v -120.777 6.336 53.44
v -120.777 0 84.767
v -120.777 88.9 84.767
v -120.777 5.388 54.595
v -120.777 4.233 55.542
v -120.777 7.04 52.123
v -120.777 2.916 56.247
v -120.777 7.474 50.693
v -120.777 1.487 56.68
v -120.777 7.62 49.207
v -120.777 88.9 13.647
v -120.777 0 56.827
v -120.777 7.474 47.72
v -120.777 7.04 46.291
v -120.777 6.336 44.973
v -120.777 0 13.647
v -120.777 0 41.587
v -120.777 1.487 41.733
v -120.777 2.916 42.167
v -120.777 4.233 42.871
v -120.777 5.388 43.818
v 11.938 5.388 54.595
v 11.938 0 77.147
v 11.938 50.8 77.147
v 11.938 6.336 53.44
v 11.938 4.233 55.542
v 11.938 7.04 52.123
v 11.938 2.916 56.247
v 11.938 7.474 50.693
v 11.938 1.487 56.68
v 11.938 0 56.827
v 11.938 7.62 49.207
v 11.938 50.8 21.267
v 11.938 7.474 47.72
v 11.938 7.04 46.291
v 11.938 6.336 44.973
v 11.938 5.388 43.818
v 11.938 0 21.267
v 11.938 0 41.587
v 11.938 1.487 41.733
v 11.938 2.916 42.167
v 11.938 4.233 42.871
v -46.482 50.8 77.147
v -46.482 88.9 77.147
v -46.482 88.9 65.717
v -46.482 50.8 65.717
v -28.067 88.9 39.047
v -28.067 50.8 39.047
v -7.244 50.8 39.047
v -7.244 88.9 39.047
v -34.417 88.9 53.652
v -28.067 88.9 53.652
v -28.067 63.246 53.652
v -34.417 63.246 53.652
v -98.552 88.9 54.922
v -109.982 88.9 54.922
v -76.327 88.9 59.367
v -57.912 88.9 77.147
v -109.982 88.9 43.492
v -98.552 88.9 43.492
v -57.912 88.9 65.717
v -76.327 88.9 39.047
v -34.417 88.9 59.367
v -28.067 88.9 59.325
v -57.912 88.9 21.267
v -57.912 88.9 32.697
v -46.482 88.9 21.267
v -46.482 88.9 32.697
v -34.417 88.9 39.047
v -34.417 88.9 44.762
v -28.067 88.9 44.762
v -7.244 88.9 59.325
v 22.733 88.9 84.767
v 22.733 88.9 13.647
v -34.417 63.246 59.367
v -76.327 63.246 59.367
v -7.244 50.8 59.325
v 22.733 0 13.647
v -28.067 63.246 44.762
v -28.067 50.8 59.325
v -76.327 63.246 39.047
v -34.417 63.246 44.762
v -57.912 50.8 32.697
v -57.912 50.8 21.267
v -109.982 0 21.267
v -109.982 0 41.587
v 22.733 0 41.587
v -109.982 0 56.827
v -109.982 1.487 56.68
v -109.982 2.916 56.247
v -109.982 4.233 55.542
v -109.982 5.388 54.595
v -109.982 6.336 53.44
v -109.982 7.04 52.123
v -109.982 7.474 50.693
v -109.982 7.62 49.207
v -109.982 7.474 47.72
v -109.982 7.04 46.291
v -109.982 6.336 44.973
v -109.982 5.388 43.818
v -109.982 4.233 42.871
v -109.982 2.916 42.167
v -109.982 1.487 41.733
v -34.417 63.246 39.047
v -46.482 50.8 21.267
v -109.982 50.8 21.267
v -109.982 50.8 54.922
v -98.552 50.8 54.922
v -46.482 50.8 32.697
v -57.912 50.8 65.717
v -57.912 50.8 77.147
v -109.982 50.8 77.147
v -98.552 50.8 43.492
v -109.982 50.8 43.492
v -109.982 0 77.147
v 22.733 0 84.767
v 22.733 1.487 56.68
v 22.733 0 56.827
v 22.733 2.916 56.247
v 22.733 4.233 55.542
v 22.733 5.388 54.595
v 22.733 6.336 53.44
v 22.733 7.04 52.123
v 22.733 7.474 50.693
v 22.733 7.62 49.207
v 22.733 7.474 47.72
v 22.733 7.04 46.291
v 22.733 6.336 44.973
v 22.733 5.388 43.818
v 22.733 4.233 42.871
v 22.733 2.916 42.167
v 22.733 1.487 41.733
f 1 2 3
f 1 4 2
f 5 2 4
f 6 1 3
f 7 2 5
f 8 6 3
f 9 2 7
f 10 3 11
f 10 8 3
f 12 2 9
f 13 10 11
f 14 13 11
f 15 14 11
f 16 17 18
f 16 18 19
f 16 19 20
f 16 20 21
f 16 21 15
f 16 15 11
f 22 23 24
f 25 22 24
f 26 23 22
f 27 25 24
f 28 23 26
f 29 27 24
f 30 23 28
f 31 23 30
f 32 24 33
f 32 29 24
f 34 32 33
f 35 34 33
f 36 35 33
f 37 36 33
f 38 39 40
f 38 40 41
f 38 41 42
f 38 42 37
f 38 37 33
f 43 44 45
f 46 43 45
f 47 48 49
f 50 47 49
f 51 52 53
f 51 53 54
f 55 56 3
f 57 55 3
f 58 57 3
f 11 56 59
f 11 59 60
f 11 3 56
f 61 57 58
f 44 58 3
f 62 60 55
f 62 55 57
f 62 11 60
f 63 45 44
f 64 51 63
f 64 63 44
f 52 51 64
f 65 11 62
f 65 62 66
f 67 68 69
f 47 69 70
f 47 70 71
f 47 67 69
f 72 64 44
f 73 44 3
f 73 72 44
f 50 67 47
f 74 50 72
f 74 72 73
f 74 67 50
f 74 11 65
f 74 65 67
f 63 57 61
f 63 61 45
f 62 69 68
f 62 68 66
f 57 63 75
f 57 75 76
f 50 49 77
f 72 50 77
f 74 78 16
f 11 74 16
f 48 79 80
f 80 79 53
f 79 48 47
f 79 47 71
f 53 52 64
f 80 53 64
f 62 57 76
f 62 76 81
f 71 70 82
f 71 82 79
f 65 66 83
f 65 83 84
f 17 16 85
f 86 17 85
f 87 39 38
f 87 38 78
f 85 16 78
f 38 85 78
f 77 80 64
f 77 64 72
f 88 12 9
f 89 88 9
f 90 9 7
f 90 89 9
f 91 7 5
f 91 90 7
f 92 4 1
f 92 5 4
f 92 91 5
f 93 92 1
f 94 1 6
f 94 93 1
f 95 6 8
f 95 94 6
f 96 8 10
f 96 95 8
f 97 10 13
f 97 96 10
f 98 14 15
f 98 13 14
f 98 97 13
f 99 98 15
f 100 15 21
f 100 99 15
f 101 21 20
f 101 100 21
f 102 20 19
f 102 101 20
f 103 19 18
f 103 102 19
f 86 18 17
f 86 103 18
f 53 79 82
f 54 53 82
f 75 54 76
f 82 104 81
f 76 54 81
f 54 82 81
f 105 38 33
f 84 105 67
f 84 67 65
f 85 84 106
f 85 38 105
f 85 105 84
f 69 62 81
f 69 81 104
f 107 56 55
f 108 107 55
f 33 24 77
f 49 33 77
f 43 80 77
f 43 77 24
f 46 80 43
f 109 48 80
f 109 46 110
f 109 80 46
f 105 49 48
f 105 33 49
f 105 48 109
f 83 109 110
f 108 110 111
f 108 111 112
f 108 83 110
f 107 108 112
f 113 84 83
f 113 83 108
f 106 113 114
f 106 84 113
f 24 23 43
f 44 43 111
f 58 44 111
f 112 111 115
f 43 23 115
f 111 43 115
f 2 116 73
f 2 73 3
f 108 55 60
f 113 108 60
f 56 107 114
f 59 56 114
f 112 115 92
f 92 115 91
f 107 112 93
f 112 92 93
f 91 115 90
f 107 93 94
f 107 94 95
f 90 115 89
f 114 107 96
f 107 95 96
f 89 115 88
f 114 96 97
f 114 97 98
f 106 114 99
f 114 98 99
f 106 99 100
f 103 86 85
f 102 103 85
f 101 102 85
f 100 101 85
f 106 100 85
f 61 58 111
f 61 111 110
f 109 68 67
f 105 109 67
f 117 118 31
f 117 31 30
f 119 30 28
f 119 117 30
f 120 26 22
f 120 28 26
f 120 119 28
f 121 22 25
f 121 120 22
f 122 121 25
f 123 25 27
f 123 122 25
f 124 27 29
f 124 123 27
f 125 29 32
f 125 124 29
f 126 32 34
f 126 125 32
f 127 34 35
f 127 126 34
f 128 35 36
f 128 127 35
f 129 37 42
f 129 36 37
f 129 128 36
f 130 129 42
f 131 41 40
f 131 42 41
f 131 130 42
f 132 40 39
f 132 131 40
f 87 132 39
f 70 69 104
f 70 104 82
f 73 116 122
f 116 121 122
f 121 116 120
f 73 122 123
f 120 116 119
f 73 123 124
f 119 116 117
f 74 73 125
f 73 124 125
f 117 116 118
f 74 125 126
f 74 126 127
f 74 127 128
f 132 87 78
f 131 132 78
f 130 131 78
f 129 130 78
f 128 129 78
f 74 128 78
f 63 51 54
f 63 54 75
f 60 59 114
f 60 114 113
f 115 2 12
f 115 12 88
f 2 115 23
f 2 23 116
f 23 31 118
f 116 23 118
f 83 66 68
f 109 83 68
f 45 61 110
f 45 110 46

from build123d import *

# Parameters (mm, degrees)
SKETCH1_W                = 143.51
SKETCH1_H                = 121.92
BIG_BLOCK_DEPTH          = 88.9
SERVO_CUTOUT_DEPTH       = 25.654
SKETCH3_W                = 121.92
SKETCH3_H                = 55.88
CUT_EXTRUDE2_DEPTH       = 50.8
CUT_EXTRUDE18_DEPTH      = 172.184986353
CUT_EXTRUDE18_DEPTH_BACK = 48.26
SKETCH6_W                = 20.822928363
SKETCH6_H                = 20.278092026
SKETCH10_W               = 11.43
SKETCH10_H               = 11.43
CUT_EXTRUDE19_DEPTH      = 187.082964166
SKETCH11_W               = 11.43
SKETCH11_H               = 11.43
CUT_EXTRUDE20_DEPTH      = 187.082964166
SKETCH9_W                = 11.43
SKETCH9_H                = 11.43
CUT_EXTRUDE22_DEPTH      = 187.082964166
SKETCH12_W               = 143.51
SKETCH12_H               = 25.4
REMOVESIDES_DEPTH        = 187.082964166
CUT_EXTRUDE23_DEPTH      = 189.901333259
CUT_EXTRUDE23_DEPTH_BACK = 189.901333259


with BuildPart() as part:
    # Sketch1 → Big Block (new body)
    with BuildSketch(Plane(origin=(0, 0, 0), x_dir=(1, 0, 0), z_dir=(0, 1, 0))):
        with Locations((-49.021531365, -49.206642066)):
            Rectangle(SKETCH1_W, SKETCH1_H)
    extrude(amount=BIG_BLOCK_DEPTH)

    # Sketch2 → Servo Cutout (cut)
    with BuildSketch(Plane(origin=(0, 88.9, 0), x_dir=(1, 0, 0), z_dir=(0, 1, 0))):
        Polygon((-76.326531365, -39.046642066), (-34.416531365, -39.046642066), (-34.416531365, -44.761642066), (-19.176531365, -44.761642066), (-19.176531365, -53.651642066), (-34.416531365, -53.651642066), (-34.416531365, -59.366642066), (-76.326531365, -59.366642066), align=None)
    extrude(amount=-SERVO_CUTOUT_DEPTH, mode=Mode.SUBTRACT)

    # Sketch3 → Cut-Extrude2 (cut)
    with BuildSketch(Plane(origin=(0, 0, 0), x_dir=(-1, 0, 0), z_dir=(0, -1, 0))):
        with Locations((49.021531365, -49.206642066)):
            Rectangle(SKETCH3_W, SKETCH3_H)
    extrude(amount=-CUT_EXTRUDE2_DEPTH, mode=Mode.SUBTRACT)

    # Sketch6 → Cut-Extrude18 (cut, two sides: drawn at the far end of the back side and taken through both)
    with BuildSketch(Plane.XZ.offset(-50.8).offset(-CUT_EXTRUDE18_DEPTH_BACK)):
        with Locations((-17.655067184, 49.185688079)):
            Rectangle(SKETCH6_W, SKETCH6_H)
    extrude(amount=CUT_EXTRUDE18_DEPTH + CUT_EXTRUDE18_DEPTH_BACK, mode=Mode.SUBTRACT)

    # Sketch10 → Cut-Extrude19 (cut, through all)
    with BuildSketch(Plane(origin=(0, 88.9, 0), x_dir=(1, 0, 0), z_dir=(0, 1, 0))):
        with Locations((-52.196531365, -26.981642066)):
            Rectangle(SKETCH10_W, SKETCH10_H)
    extrude(amount=-CUT_EXTRUDE19_DEPTH, mode=Mode.SUBTRACT)

    # Sketch11 → Cut-Extrude20 (cut, through all)
    with BuildSketch(Plane(origin=(0, 88.9, 0), x_dir=(1, 0, 0), z_dir=(0, 1, 0))):
        with Locations((-52.196531365, -71.431642066)):
            Rectangle(SKETCH11_W, SKETCH11_H)
    extrude(amount=-CUT_EXTRUDE20_DEPTH, mode=Mode.SUBTRACT)

    # Sketch9 → Cut-Extrude22 (cut, through all)
    with BuildSketch(Plane(origin=(0, 88.9, 0), x_dir=(1, 0, 0), z_dir=(0, 1, 0))):
        with Locations((-104.266531365, -49.206642066)):
            Rectangle(SKETCH9_W, SKETCH9_H)
    extrude(amount=-CUT_EXTRUDE22_DEPTH, mode=Mode.SUBTRACT)

    # Sketch12 → removesides (cut, through all)
    with BuildSketch(Plane(origin=(0, 0, 0), x_dir=(-1, 0, 0), z_dir=(0, -1, 0))):
        with Locations((49.021531365, -97.466642066)):
            Rectangle(SKETCH12_W, SKETCH12_H)
        with Locations((49.021531365, -0.946642066)):
            Rectangle(SKETCH12_W, SKETCH12_H)
    extrude(amount=-REMOVESIDES_DEPTH, mode=Mode.SUBTRACT)

    # Sketch13 → Cut-Extrude23 (cut, two sides: drawn at the far end of the back side and taken through both)
    with BuildSketch(Plane.ZY.offset(120.776531365).offset(-CUT_EXTRUDE23_DEPTH_BACK)):
        with BuildLine():
            Line((41.586642066, 0), (56.826642066, 0))
            ThreePointArc((56.826642066, 0), (49.206642066, 7.62), (41.586642066, 0))
        make_face()
    extrude(amount=CUT_EXTRUDE23_DEPTH + CUT_EXTRUDE23_DEPTH_BACK, mode=Mode.SUBTRACT)


solid = part.part
